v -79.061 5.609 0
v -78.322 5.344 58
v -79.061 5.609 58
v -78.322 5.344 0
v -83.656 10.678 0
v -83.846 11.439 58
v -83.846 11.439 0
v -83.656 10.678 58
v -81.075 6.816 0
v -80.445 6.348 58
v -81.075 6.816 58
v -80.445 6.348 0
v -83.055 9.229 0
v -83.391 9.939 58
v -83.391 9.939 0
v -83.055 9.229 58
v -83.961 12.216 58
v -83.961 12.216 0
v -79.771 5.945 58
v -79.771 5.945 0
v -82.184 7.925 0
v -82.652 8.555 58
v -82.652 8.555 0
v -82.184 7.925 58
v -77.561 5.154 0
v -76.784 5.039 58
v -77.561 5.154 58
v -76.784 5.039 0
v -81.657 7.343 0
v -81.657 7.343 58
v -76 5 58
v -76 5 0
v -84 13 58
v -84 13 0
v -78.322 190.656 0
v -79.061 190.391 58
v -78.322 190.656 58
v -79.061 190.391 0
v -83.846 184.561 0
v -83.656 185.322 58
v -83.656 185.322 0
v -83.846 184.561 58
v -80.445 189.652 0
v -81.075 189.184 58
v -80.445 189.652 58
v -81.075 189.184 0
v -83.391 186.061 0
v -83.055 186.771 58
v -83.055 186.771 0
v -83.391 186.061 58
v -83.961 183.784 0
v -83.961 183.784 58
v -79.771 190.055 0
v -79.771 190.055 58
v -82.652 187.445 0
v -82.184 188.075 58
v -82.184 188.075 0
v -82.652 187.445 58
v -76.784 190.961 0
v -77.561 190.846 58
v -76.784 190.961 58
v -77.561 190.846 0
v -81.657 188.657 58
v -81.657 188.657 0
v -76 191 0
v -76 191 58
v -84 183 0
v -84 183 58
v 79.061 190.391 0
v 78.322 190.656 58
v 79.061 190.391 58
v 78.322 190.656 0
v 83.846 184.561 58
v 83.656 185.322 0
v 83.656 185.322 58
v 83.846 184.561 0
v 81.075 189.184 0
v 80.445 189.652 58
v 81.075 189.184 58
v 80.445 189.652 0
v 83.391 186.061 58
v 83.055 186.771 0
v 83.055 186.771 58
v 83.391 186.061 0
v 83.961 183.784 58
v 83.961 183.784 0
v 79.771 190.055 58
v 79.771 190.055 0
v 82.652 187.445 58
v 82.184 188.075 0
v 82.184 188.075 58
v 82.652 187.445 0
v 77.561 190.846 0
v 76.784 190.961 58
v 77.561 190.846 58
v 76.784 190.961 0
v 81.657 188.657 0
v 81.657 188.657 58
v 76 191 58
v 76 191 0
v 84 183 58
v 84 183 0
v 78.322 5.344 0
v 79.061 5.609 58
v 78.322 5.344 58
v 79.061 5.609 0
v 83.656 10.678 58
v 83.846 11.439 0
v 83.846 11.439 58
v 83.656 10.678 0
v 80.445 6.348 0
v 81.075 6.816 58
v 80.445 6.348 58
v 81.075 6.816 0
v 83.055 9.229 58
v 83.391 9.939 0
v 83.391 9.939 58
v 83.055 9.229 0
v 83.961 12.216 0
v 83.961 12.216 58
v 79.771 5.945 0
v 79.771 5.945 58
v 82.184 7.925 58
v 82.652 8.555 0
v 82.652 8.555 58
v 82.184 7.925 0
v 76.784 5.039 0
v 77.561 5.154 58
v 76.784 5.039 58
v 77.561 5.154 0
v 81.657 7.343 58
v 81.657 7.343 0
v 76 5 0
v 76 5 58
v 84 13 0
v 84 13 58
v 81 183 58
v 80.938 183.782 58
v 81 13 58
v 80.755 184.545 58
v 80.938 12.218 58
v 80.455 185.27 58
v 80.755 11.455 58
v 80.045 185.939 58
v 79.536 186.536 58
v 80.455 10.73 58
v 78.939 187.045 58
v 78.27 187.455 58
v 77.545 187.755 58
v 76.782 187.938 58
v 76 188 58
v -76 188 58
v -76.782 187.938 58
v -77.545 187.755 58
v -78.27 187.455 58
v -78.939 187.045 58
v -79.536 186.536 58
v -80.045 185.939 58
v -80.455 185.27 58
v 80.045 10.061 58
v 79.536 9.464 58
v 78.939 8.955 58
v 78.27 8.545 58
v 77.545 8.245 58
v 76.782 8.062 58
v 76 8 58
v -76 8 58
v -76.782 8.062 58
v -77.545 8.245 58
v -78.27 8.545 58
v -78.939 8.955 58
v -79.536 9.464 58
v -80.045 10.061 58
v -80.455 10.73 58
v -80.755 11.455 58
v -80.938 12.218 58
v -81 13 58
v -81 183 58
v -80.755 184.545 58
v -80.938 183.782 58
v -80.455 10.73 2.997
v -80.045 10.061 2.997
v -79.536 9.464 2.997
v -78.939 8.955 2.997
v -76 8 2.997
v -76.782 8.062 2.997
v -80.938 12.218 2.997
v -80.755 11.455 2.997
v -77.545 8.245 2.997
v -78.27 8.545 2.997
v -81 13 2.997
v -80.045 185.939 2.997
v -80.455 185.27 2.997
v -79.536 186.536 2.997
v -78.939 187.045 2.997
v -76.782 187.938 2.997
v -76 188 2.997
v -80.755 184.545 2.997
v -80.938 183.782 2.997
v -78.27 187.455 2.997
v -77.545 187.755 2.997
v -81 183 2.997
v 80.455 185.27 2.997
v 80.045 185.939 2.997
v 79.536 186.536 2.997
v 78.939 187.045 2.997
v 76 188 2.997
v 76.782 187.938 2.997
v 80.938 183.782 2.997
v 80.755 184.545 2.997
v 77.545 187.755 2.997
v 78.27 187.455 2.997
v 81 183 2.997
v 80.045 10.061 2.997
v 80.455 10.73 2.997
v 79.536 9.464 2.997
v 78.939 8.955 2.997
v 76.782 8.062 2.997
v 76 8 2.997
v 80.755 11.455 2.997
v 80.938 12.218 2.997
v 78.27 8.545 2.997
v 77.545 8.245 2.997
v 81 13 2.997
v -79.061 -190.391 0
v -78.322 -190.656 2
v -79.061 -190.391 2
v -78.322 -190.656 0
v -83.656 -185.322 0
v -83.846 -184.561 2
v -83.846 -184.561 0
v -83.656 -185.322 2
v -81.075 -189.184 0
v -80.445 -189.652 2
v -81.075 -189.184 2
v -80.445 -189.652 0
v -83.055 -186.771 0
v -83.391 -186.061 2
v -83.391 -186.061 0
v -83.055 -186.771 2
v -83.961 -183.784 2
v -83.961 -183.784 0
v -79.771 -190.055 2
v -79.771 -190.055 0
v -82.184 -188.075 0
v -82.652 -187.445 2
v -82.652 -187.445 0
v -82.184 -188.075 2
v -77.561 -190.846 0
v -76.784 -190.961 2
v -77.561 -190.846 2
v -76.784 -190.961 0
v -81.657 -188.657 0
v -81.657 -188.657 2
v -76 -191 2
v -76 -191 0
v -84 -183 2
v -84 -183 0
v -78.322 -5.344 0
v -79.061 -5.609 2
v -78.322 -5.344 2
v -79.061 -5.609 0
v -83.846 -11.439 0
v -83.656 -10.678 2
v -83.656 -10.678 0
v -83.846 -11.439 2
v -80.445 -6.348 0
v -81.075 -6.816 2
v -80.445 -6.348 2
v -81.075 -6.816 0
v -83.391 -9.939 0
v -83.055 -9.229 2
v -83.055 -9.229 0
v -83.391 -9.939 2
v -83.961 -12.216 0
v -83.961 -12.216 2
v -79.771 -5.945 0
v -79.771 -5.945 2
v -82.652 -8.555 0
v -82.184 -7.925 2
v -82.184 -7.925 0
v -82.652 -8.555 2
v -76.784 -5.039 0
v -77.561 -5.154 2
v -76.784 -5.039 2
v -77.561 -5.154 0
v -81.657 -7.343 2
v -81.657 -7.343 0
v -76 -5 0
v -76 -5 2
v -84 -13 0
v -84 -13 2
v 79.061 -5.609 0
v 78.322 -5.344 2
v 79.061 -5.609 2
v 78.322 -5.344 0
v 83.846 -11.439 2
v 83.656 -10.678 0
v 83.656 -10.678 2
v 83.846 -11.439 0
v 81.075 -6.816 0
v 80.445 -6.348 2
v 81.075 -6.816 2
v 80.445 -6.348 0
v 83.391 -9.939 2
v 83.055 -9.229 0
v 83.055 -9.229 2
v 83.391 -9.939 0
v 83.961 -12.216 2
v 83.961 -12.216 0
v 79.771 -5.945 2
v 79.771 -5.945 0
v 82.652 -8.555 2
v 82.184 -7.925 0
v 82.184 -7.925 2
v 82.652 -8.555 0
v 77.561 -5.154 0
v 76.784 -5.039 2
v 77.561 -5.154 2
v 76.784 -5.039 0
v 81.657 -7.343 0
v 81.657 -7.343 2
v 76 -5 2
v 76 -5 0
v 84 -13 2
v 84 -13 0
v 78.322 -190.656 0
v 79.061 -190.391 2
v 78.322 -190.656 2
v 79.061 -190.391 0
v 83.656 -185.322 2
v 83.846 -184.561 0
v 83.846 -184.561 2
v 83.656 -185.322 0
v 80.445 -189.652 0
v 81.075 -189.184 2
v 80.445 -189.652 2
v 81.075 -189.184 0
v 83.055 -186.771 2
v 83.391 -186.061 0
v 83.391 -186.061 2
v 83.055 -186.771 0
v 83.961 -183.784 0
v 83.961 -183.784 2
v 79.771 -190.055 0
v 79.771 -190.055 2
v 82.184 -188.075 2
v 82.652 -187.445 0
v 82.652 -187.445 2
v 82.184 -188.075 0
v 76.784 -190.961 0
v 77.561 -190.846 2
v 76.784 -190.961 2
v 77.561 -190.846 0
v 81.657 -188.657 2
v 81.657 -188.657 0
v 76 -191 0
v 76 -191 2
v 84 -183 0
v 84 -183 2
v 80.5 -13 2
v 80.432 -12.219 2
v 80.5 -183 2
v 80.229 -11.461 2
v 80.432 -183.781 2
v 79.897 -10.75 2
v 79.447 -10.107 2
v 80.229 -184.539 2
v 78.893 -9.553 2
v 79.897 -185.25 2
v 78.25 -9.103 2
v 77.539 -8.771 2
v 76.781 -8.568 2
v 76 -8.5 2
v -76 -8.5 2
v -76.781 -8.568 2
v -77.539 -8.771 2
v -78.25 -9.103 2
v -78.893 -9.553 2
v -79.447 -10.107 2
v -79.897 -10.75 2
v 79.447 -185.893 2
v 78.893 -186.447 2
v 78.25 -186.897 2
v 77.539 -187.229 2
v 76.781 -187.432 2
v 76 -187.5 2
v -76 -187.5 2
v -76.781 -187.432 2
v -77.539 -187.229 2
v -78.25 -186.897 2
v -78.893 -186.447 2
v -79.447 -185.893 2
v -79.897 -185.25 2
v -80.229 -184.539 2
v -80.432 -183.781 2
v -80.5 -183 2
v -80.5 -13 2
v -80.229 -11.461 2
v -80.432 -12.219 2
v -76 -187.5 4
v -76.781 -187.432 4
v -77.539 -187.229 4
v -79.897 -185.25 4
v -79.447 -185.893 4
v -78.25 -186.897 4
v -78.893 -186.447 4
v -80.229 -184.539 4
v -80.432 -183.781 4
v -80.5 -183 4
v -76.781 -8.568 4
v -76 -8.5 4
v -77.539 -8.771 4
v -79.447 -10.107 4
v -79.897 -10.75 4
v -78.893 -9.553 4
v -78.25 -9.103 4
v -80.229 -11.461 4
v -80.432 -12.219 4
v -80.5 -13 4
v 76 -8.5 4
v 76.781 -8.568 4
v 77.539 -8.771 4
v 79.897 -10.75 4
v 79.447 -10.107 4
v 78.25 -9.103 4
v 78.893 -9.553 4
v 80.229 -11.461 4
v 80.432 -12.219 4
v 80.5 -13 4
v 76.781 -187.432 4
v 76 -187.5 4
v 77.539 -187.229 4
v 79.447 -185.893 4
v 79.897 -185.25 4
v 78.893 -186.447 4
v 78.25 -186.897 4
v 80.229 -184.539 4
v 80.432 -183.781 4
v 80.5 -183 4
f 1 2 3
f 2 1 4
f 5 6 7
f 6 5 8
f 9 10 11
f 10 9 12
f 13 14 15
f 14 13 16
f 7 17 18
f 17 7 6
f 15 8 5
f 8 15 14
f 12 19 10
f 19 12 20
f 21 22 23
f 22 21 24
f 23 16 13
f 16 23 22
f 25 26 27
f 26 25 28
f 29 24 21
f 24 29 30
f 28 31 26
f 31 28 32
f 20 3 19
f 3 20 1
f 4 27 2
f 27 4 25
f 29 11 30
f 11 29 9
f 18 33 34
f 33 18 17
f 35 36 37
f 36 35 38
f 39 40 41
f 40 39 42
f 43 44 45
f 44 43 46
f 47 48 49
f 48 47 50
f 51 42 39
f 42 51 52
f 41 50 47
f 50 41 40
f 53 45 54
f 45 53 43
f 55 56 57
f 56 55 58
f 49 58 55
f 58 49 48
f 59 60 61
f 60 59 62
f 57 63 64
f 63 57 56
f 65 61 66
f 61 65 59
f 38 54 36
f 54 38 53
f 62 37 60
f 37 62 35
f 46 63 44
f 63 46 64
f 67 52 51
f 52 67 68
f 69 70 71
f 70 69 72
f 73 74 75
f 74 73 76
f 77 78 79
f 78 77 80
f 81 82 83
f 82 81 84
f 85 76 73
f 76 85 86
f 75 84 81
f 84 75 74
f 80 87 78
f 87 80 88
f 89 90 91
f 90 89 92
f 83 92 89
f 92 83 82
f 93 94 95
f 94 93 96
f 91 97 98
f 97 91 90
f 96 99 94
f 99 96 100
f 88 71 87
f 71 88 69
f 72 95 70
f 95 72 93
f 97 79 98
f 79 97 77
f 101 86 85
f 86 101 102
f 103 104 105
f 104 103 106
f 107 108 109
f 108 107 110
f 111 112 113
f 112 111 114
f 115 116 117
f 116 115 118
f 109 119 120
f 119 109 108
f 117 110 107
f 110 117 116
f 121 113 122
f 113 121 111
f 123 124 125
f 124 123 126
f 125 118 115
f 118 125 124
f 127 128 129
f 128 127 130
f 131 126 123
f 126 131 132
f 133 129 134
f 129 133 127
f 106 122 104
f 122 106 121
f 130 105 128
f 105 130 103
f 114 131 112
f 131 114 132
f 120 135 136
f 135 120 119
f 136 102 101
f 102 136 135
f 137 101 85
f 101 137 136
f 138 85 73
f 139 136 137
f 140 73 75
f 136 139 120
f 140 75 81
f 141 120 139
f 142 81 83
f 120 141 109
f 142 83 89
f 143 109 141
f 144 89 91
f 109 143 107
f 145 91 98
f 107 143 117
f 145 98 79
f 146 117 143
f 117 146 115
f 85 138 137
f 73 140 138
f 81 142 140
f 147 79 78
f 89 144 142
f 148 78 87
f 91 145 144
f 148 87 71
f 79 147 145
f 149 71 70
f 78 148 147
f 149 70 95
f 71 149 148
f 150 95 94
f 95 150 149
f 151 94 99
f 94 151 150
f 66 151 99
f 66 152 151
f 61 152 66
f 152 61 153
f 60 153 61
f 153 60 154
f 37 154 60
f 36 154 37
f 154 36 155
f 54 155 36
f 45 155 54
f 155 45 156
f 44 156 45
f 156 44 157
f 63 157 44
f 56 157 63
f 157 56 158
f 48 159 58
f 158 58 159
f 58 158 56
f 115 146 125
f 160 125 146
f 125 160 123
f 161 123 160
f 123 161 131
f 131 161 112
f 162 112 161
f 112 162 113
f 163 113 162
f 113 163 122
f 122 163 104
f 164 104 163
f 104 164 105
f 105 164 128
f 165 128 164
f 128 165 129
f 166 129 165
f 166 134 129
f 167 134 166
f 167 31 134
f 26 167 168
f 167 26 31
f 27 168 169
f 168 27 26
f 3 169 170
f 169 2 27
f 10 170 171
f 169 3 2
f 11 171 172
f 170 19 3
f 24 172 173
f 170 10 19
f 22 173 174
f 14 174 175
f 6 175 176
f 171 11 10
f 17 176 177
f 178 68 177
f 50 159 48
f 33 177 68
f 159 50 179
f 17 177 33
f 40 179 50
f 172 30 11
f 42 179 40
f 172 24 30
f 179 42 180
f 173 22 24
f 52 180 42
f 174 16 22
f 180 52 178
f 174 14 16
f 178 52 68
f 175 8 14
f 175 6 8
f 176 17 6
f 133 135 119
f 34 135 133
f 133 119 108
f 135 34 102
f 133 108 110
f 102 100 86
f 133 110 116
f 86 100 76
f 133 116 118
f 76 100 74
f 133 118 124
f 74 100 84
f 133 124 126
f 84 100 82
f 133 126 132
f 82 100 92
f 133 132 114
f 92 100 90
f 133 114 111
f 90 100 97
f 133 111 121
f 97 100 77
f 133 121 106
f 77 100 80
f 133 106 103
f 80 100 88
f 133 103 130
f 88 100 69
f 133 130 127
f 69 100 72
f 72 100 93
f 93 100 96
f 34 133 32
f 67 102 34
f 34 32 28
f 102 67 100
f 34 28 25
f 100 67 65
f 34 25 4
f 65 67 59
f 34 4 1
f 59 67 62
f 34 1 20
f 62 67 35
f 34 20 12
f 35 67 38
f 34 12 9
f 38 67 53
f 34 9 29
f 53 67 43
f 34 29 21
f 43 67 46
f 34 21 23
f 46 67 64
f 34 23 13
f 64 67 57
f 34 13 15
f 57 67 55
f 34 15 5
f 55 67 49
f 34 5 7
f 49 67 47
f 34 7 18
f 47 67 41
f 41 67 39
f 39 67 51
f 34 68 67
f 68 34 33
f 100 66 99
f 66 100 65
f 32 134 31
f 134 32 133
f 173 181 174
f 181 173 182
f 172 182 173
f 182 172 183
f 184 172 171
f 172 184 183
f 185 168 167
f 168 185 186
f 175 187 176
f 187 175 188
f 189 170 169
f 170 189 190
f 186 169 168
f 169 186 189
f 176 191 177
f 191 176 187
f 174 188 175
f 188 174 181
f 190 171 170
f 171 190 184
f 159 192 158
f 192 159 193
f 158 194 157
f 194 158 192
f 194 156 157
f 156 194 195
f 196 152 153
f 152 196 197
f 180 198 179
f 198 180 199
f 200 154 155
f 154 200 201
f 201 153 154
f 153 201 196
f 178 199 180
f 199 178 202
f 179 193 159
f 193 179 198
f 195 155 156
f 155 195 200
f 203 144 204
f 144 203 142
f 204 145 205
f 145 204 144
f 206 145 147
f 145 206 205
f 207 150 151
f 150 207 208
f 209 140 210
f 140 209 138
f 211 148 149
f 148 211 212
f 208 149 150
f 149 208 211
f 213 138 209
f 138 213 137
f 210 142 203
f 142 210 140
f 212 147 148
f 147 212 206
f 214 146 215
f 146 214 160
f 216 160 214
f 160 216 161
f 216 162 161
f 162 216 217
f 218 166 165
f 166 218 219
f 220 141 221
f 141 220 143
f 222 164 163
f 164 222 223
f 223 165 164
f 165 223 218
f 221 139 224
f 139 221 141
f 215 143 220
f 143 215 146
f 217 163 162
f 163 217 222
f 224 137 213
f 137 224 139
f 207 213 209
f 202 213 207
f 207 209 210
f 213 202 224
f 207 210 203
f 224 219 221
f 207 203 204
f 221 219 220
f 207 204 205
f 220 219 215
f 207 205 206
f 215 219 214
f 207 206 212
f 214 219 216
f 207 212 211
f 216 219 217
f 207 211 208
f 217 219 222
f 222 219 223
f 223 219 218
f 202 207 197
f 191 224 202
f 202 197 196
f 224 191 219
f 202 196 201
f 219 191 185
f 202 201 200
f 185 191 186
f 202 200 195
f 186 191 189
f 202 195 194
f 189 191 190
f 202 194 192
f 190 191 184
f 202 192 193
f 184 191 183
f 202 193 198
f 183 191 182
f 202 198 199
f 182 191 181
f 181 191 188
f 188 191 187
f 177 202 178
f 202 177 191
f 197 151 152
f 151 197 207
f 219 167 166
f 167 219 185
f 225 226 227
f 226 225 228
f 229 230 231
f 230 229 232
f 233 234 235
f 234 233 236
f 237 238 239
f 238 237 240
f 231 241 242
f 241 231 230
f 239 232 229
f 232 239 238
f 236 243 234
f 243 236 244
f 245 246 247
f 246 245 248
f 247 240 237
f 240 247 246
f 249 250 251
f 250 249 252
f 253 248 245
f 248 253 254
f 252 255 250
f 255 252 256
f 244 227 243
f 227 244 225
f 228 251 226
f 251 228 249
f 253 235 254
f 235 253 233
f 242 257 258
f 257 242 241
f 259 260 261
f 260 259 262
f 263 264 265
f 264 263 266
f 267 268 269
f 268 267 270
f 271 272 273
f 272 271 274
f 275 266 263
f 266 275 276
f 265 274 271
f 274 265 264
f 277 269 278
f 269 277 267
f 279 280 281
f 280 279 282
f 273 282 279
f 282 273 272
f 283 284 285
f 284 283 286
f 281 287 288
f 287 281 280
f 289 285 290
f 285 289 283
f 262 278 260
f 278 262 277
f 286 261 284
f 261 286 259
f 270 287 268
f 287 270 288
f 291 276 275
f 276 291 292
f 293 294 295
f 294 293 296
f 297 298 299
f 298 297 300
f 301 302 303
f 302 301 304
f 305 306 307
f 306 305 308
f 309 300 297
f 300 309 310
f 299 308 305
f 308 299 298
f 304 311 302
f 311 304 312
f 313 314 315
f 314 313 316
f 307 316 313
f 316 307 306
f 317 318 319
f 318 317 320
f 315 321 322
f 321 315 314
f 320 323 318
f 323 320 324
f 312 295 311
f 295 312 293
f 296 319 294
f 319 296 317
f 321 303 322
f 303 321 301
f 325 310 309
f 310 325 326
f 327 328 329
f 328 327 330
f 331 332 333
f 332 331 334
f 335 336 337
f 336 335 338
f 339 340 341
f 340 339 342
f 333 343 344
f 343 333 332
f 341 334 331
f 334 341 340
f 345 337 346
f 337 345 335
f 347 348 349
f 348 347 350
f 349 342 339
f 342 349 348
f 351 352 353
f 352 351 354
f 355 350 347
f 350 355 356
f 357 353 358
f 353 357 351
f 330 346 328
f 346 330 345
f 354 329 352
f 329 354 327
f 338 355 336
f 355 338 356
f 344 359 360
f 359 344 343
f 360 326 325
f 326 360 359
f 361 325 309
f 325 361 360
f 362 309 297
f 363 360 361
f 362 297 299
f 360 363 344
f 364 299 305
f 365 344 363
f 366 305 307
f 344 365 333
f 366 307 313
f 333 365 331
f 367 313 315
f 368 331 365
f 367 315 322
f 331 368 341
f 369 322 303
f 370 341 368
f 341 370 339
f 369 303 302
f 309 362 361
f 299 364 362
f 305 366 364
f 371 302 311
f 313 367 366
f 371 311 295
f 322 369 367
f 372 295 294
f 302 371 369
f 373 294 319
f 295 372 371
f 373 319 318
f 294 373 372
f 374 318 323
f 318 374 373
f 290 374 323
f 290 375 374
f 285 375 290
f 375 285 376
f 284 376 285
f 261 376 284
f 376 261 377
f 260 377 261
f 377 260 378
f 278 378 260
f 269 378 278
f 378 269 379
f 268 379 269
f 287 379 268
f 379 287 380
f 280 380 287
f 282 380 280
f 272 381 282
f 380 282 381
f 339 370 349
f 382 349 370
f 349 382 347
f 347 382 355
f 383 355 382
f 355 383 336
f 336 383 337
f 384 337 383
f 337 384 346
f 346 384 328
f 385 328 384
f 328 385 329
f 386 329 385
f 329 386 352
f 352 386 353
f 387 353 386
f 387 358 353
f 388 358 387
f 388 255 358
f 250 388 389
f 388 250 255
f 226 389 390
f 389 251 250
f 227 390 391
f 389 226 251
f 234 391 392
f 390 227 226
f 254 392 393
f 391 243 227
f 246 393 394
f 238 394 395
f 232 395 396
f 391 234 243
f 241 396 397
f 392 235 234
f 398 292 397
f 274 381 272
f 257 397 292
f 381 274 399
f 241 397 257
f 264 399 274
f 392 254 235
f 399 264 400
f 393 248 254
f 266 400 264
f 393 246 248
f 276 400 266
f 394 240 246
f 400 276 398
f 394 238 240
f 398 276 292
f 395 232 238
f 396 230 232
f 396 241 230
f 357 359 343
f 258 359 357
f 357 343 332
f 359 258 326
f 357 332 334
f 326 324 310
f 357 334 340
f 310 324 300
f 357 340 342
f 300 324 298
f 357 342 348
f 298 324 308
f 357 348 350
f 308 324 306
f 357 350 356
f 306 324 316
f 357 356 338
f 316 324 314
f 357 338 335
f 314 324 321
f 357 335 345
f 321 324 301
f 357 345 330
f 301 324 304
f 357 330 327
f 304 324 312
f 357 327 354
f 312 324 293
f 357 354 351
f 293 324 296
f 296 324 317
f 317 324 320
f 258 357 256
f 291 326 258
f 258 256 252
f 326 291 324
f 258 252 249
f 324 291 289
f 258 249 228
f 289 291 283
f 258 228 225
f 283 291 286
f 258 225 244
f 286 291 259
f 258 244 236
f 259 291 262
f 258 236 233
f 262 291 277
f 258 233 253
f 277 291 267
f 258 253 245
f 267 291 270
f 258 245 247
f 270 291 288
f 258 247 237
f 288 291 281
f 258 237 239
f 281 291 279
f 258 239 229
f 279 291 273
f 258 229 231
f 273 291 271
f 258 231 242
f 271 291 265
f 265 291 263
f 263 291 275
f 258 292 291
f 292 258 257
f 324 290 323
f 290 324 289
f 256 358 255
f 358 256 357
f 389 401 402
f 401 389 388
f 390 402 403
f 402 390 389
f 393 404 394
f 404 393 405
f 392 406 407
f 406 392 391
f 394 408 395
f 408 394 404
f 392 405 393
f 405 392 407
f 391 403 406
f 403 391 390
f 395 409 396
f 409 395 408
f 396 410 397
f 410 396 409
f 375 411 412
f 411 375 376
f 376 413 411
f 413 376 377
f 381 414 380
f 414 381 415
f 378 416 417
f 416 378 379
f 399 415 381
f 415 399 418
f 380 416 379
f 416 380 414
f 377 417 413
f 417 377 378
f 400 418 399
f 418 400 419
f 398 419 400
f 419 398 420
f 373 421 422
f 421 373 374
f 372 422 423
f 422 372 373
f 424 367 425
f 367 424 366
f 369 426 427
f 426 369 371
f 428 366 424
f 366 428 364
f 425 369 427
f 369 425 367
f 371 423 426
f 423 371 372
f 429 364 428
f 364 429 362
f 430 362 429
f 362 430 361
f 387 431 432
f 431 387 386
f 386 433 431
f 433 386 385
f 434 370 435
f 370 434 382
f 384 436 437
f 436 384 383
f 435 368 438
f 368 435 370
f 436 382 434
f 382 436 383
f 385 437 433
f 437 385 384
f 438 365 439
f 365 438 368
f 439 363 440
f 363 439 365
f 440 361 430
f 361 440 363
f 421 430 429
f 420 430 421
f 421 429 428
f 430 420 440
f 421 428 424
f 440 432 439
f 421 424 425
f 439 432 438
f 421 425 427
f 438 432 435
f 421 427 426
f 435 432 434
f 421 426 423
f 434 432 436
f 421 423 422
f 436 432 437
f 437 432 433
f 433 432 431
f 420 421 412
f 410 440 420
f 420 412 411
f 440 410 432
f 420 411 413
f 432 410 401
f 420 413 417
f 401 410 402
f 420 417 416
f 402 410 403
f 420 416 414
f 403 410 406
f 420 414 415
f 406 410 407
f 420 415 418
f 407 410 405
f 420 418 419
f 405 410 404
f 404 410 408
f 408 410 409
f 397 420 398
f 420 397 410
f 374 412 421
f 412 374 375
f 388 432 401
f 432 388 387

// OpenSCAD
//------------------------------------
// Customisable Project Box by Mattki
//------------------------------------

// Dimensions in mm unless otherwise specified

// Outer Box dimensions

length = 168; // length of the box
width = 186; // width of the box
height = 60; // height or depth of the box (including fitted lid)
lid_height = 2; // height or thickness of the lid (the part of the lid that sits above the top of the box
overlap_box_to_lid = 2; // additional thickness for the lid (reduces available interior volume but helps to locate the lid in assembly)
wall_thickness = 3; // thickness of the side walls of the box (take two times this figure off of the length and width of the box to find the available internal space!)
base_thickness = 3; // thickness of the base of the box
corner_radius = 8; // corner radius

// Mounting Post dimensions

post_height = 6; // height of the mounting post
od = 8; // outer diameter of post
id = 3; // diameter of internal hole

module screw_stand(){
    // Note this part has not been modified to be customisable and has not been incorporated into the design.
    difference(){
        union(){
            translate([0,0,11]) cylinder(h=22,d=8,$fn=36,center=true);
            translate([0,-3,11]) cube([8,6,22],center=true);
        }
        translate([0,4,0]) rotate([0,90,0]) cylinder(h=8.01,d=20,$fn=4,center=true);
        translate([0,0,17.01]) cylinder(h=10,d=3,$fn=36,center=true);
    }
}

module post_set(board_width,board_height,post_height,od,id,board_edge){
    // Ready but not used in the example
    translate([board_height/2,board_width/2,0]) mounting_post(post_height,od,id);
    translate([-board_height/2,board_width/2,0]) mounting_post(post_height,od,id);
    translate([board_height/2,-board_width/2,0]) mounting_post(post_height,od,id);
    translate([-board_height/2,-board_width/2,0]) mounting_post(post_height,od,id);
}

module mounting_post(post_height,od,id){
    // Ready but not used in the example
    difference(){
        translate([0,0,post_height/2]) cylinder(h=post_height,d=od,$fn=(od/2)*6,center=true);
        translate([0,0,post_height/2]) cylinder(h=post_height,d=id,$fn=(od/2)*6,center=true);
    }
}

module corner_subt(use_radius,use_length,use_width,use_height){
    translate([(use_radius-use_length)/2,(-use_width+use_radius)/2,use_height/2]) difference(){
        translate([-0.5,-0.5,0]) cube([use_radius+1,use_radius+1,use_height+0.005],center=true);
        translate([use_radius/2,use_radius/2,0]) cylinder(h=use_height+0.01,d=use_radius*2,$fn=round(use_radius*8)- round(use_radius*8) % 4,center=true);
    }
}

module project_box(){
    translate([0,width/2+5,0]) difference(){
        difference(){
            translate([0,0,(height-lid_height)/2]) cube([length,width,height-lid_height],center=true);
            corner_subt(corner_radius,length,width,height-lid_height);
            scale([1,-1,1]) corner_subt(corner_radius,length,width,height-lid_height);
            scale([-1,-1,1]) corner_subt(corner_radius,length,width,height-lid_height);
            scale([-1,1,1]) corner_subt(corner_radius,length,width,height-lid_height);
        }
        difference(){
            translate([0,0,(height-lid_height+base_thickness+0.005)/2]) cube([length-wall_thickness*2,width-wall_thickness*2,height-lid_height-base_thickness+0.01],center=true);
            corner_subt(corner_radius-wall_thickness,length-wall_thickness*2,width-wall_thickness*2,height-lid_height);
            scale([1,-1,1]) corner_subt(corner_radius-wall_thickness,length-wall_thickness*2,width-wall_thickness*2,height-lid_height);
            scale([-1,-1,1]) corner_subt(corner_radius-wall_thickness,length-wall_thickness*2,width-wall_thickness*2,height-lid_height);
            scale([-1,1,1]) corner_subt(corner_radius-wall_thickness,length-wall_thickness*2,width-wall_thickness*2,height-lid_height);
        }
    }
}

module project_box_lid(){
    difference(){
        translate([0,-(width/2+5),0]) union(){
            difference(){
                translate([0,0,lid_height/2]) cube([length,width,lid_height],center=true);
                corner_subt(corner_radius,length,width,lid_height);
                scale([1,-1,1]) corner_subt(corner_radius,length,width,lid_height);
                scale([-1,-1,1]) corner_subt(corner_radius,length,width,lid_height);
                scale([-1,1,1]) corner_subt(corner_radius,length,width,lid_height);
            }
            difference(){
                translate([0,0,(lid_height+overlap_box_to_lid)/2]) cube([length-wall_thickness*2-1,width-wall_thickness*2-1,lid_height+overlap_box_to_lid],center=true);
                corner_subt(corner_radius-wall_thickness-0.5,length-wall_thickness*2-1,width-wall_thickness*2-1,lid_height+overlap_box_to_lid);
                scale([1,-1,1]) corner_subt(corner_radius-wall_thickness-0.5,length-wall_thickness*2-1,width-wall_thickness*2-1,lid_height+overlap_box_to_lid);
                scale([-1,-1,1]) corner_subt(corner_radius-wall_thickness-0.5,length-wall_thickness*2-1,width-wall_thickness*2-1,lid_height+overlap_box_to_lid);
                scale([-1,1,1]) corner_subt(corner_radius-wall_thickness-0.5,length-wall_thickness*2-1,width-wall_thickness*2-1,lid_height+overlap_box_to_lid);
            }
        }    
    }
}

project_box();
project_box_lid();
